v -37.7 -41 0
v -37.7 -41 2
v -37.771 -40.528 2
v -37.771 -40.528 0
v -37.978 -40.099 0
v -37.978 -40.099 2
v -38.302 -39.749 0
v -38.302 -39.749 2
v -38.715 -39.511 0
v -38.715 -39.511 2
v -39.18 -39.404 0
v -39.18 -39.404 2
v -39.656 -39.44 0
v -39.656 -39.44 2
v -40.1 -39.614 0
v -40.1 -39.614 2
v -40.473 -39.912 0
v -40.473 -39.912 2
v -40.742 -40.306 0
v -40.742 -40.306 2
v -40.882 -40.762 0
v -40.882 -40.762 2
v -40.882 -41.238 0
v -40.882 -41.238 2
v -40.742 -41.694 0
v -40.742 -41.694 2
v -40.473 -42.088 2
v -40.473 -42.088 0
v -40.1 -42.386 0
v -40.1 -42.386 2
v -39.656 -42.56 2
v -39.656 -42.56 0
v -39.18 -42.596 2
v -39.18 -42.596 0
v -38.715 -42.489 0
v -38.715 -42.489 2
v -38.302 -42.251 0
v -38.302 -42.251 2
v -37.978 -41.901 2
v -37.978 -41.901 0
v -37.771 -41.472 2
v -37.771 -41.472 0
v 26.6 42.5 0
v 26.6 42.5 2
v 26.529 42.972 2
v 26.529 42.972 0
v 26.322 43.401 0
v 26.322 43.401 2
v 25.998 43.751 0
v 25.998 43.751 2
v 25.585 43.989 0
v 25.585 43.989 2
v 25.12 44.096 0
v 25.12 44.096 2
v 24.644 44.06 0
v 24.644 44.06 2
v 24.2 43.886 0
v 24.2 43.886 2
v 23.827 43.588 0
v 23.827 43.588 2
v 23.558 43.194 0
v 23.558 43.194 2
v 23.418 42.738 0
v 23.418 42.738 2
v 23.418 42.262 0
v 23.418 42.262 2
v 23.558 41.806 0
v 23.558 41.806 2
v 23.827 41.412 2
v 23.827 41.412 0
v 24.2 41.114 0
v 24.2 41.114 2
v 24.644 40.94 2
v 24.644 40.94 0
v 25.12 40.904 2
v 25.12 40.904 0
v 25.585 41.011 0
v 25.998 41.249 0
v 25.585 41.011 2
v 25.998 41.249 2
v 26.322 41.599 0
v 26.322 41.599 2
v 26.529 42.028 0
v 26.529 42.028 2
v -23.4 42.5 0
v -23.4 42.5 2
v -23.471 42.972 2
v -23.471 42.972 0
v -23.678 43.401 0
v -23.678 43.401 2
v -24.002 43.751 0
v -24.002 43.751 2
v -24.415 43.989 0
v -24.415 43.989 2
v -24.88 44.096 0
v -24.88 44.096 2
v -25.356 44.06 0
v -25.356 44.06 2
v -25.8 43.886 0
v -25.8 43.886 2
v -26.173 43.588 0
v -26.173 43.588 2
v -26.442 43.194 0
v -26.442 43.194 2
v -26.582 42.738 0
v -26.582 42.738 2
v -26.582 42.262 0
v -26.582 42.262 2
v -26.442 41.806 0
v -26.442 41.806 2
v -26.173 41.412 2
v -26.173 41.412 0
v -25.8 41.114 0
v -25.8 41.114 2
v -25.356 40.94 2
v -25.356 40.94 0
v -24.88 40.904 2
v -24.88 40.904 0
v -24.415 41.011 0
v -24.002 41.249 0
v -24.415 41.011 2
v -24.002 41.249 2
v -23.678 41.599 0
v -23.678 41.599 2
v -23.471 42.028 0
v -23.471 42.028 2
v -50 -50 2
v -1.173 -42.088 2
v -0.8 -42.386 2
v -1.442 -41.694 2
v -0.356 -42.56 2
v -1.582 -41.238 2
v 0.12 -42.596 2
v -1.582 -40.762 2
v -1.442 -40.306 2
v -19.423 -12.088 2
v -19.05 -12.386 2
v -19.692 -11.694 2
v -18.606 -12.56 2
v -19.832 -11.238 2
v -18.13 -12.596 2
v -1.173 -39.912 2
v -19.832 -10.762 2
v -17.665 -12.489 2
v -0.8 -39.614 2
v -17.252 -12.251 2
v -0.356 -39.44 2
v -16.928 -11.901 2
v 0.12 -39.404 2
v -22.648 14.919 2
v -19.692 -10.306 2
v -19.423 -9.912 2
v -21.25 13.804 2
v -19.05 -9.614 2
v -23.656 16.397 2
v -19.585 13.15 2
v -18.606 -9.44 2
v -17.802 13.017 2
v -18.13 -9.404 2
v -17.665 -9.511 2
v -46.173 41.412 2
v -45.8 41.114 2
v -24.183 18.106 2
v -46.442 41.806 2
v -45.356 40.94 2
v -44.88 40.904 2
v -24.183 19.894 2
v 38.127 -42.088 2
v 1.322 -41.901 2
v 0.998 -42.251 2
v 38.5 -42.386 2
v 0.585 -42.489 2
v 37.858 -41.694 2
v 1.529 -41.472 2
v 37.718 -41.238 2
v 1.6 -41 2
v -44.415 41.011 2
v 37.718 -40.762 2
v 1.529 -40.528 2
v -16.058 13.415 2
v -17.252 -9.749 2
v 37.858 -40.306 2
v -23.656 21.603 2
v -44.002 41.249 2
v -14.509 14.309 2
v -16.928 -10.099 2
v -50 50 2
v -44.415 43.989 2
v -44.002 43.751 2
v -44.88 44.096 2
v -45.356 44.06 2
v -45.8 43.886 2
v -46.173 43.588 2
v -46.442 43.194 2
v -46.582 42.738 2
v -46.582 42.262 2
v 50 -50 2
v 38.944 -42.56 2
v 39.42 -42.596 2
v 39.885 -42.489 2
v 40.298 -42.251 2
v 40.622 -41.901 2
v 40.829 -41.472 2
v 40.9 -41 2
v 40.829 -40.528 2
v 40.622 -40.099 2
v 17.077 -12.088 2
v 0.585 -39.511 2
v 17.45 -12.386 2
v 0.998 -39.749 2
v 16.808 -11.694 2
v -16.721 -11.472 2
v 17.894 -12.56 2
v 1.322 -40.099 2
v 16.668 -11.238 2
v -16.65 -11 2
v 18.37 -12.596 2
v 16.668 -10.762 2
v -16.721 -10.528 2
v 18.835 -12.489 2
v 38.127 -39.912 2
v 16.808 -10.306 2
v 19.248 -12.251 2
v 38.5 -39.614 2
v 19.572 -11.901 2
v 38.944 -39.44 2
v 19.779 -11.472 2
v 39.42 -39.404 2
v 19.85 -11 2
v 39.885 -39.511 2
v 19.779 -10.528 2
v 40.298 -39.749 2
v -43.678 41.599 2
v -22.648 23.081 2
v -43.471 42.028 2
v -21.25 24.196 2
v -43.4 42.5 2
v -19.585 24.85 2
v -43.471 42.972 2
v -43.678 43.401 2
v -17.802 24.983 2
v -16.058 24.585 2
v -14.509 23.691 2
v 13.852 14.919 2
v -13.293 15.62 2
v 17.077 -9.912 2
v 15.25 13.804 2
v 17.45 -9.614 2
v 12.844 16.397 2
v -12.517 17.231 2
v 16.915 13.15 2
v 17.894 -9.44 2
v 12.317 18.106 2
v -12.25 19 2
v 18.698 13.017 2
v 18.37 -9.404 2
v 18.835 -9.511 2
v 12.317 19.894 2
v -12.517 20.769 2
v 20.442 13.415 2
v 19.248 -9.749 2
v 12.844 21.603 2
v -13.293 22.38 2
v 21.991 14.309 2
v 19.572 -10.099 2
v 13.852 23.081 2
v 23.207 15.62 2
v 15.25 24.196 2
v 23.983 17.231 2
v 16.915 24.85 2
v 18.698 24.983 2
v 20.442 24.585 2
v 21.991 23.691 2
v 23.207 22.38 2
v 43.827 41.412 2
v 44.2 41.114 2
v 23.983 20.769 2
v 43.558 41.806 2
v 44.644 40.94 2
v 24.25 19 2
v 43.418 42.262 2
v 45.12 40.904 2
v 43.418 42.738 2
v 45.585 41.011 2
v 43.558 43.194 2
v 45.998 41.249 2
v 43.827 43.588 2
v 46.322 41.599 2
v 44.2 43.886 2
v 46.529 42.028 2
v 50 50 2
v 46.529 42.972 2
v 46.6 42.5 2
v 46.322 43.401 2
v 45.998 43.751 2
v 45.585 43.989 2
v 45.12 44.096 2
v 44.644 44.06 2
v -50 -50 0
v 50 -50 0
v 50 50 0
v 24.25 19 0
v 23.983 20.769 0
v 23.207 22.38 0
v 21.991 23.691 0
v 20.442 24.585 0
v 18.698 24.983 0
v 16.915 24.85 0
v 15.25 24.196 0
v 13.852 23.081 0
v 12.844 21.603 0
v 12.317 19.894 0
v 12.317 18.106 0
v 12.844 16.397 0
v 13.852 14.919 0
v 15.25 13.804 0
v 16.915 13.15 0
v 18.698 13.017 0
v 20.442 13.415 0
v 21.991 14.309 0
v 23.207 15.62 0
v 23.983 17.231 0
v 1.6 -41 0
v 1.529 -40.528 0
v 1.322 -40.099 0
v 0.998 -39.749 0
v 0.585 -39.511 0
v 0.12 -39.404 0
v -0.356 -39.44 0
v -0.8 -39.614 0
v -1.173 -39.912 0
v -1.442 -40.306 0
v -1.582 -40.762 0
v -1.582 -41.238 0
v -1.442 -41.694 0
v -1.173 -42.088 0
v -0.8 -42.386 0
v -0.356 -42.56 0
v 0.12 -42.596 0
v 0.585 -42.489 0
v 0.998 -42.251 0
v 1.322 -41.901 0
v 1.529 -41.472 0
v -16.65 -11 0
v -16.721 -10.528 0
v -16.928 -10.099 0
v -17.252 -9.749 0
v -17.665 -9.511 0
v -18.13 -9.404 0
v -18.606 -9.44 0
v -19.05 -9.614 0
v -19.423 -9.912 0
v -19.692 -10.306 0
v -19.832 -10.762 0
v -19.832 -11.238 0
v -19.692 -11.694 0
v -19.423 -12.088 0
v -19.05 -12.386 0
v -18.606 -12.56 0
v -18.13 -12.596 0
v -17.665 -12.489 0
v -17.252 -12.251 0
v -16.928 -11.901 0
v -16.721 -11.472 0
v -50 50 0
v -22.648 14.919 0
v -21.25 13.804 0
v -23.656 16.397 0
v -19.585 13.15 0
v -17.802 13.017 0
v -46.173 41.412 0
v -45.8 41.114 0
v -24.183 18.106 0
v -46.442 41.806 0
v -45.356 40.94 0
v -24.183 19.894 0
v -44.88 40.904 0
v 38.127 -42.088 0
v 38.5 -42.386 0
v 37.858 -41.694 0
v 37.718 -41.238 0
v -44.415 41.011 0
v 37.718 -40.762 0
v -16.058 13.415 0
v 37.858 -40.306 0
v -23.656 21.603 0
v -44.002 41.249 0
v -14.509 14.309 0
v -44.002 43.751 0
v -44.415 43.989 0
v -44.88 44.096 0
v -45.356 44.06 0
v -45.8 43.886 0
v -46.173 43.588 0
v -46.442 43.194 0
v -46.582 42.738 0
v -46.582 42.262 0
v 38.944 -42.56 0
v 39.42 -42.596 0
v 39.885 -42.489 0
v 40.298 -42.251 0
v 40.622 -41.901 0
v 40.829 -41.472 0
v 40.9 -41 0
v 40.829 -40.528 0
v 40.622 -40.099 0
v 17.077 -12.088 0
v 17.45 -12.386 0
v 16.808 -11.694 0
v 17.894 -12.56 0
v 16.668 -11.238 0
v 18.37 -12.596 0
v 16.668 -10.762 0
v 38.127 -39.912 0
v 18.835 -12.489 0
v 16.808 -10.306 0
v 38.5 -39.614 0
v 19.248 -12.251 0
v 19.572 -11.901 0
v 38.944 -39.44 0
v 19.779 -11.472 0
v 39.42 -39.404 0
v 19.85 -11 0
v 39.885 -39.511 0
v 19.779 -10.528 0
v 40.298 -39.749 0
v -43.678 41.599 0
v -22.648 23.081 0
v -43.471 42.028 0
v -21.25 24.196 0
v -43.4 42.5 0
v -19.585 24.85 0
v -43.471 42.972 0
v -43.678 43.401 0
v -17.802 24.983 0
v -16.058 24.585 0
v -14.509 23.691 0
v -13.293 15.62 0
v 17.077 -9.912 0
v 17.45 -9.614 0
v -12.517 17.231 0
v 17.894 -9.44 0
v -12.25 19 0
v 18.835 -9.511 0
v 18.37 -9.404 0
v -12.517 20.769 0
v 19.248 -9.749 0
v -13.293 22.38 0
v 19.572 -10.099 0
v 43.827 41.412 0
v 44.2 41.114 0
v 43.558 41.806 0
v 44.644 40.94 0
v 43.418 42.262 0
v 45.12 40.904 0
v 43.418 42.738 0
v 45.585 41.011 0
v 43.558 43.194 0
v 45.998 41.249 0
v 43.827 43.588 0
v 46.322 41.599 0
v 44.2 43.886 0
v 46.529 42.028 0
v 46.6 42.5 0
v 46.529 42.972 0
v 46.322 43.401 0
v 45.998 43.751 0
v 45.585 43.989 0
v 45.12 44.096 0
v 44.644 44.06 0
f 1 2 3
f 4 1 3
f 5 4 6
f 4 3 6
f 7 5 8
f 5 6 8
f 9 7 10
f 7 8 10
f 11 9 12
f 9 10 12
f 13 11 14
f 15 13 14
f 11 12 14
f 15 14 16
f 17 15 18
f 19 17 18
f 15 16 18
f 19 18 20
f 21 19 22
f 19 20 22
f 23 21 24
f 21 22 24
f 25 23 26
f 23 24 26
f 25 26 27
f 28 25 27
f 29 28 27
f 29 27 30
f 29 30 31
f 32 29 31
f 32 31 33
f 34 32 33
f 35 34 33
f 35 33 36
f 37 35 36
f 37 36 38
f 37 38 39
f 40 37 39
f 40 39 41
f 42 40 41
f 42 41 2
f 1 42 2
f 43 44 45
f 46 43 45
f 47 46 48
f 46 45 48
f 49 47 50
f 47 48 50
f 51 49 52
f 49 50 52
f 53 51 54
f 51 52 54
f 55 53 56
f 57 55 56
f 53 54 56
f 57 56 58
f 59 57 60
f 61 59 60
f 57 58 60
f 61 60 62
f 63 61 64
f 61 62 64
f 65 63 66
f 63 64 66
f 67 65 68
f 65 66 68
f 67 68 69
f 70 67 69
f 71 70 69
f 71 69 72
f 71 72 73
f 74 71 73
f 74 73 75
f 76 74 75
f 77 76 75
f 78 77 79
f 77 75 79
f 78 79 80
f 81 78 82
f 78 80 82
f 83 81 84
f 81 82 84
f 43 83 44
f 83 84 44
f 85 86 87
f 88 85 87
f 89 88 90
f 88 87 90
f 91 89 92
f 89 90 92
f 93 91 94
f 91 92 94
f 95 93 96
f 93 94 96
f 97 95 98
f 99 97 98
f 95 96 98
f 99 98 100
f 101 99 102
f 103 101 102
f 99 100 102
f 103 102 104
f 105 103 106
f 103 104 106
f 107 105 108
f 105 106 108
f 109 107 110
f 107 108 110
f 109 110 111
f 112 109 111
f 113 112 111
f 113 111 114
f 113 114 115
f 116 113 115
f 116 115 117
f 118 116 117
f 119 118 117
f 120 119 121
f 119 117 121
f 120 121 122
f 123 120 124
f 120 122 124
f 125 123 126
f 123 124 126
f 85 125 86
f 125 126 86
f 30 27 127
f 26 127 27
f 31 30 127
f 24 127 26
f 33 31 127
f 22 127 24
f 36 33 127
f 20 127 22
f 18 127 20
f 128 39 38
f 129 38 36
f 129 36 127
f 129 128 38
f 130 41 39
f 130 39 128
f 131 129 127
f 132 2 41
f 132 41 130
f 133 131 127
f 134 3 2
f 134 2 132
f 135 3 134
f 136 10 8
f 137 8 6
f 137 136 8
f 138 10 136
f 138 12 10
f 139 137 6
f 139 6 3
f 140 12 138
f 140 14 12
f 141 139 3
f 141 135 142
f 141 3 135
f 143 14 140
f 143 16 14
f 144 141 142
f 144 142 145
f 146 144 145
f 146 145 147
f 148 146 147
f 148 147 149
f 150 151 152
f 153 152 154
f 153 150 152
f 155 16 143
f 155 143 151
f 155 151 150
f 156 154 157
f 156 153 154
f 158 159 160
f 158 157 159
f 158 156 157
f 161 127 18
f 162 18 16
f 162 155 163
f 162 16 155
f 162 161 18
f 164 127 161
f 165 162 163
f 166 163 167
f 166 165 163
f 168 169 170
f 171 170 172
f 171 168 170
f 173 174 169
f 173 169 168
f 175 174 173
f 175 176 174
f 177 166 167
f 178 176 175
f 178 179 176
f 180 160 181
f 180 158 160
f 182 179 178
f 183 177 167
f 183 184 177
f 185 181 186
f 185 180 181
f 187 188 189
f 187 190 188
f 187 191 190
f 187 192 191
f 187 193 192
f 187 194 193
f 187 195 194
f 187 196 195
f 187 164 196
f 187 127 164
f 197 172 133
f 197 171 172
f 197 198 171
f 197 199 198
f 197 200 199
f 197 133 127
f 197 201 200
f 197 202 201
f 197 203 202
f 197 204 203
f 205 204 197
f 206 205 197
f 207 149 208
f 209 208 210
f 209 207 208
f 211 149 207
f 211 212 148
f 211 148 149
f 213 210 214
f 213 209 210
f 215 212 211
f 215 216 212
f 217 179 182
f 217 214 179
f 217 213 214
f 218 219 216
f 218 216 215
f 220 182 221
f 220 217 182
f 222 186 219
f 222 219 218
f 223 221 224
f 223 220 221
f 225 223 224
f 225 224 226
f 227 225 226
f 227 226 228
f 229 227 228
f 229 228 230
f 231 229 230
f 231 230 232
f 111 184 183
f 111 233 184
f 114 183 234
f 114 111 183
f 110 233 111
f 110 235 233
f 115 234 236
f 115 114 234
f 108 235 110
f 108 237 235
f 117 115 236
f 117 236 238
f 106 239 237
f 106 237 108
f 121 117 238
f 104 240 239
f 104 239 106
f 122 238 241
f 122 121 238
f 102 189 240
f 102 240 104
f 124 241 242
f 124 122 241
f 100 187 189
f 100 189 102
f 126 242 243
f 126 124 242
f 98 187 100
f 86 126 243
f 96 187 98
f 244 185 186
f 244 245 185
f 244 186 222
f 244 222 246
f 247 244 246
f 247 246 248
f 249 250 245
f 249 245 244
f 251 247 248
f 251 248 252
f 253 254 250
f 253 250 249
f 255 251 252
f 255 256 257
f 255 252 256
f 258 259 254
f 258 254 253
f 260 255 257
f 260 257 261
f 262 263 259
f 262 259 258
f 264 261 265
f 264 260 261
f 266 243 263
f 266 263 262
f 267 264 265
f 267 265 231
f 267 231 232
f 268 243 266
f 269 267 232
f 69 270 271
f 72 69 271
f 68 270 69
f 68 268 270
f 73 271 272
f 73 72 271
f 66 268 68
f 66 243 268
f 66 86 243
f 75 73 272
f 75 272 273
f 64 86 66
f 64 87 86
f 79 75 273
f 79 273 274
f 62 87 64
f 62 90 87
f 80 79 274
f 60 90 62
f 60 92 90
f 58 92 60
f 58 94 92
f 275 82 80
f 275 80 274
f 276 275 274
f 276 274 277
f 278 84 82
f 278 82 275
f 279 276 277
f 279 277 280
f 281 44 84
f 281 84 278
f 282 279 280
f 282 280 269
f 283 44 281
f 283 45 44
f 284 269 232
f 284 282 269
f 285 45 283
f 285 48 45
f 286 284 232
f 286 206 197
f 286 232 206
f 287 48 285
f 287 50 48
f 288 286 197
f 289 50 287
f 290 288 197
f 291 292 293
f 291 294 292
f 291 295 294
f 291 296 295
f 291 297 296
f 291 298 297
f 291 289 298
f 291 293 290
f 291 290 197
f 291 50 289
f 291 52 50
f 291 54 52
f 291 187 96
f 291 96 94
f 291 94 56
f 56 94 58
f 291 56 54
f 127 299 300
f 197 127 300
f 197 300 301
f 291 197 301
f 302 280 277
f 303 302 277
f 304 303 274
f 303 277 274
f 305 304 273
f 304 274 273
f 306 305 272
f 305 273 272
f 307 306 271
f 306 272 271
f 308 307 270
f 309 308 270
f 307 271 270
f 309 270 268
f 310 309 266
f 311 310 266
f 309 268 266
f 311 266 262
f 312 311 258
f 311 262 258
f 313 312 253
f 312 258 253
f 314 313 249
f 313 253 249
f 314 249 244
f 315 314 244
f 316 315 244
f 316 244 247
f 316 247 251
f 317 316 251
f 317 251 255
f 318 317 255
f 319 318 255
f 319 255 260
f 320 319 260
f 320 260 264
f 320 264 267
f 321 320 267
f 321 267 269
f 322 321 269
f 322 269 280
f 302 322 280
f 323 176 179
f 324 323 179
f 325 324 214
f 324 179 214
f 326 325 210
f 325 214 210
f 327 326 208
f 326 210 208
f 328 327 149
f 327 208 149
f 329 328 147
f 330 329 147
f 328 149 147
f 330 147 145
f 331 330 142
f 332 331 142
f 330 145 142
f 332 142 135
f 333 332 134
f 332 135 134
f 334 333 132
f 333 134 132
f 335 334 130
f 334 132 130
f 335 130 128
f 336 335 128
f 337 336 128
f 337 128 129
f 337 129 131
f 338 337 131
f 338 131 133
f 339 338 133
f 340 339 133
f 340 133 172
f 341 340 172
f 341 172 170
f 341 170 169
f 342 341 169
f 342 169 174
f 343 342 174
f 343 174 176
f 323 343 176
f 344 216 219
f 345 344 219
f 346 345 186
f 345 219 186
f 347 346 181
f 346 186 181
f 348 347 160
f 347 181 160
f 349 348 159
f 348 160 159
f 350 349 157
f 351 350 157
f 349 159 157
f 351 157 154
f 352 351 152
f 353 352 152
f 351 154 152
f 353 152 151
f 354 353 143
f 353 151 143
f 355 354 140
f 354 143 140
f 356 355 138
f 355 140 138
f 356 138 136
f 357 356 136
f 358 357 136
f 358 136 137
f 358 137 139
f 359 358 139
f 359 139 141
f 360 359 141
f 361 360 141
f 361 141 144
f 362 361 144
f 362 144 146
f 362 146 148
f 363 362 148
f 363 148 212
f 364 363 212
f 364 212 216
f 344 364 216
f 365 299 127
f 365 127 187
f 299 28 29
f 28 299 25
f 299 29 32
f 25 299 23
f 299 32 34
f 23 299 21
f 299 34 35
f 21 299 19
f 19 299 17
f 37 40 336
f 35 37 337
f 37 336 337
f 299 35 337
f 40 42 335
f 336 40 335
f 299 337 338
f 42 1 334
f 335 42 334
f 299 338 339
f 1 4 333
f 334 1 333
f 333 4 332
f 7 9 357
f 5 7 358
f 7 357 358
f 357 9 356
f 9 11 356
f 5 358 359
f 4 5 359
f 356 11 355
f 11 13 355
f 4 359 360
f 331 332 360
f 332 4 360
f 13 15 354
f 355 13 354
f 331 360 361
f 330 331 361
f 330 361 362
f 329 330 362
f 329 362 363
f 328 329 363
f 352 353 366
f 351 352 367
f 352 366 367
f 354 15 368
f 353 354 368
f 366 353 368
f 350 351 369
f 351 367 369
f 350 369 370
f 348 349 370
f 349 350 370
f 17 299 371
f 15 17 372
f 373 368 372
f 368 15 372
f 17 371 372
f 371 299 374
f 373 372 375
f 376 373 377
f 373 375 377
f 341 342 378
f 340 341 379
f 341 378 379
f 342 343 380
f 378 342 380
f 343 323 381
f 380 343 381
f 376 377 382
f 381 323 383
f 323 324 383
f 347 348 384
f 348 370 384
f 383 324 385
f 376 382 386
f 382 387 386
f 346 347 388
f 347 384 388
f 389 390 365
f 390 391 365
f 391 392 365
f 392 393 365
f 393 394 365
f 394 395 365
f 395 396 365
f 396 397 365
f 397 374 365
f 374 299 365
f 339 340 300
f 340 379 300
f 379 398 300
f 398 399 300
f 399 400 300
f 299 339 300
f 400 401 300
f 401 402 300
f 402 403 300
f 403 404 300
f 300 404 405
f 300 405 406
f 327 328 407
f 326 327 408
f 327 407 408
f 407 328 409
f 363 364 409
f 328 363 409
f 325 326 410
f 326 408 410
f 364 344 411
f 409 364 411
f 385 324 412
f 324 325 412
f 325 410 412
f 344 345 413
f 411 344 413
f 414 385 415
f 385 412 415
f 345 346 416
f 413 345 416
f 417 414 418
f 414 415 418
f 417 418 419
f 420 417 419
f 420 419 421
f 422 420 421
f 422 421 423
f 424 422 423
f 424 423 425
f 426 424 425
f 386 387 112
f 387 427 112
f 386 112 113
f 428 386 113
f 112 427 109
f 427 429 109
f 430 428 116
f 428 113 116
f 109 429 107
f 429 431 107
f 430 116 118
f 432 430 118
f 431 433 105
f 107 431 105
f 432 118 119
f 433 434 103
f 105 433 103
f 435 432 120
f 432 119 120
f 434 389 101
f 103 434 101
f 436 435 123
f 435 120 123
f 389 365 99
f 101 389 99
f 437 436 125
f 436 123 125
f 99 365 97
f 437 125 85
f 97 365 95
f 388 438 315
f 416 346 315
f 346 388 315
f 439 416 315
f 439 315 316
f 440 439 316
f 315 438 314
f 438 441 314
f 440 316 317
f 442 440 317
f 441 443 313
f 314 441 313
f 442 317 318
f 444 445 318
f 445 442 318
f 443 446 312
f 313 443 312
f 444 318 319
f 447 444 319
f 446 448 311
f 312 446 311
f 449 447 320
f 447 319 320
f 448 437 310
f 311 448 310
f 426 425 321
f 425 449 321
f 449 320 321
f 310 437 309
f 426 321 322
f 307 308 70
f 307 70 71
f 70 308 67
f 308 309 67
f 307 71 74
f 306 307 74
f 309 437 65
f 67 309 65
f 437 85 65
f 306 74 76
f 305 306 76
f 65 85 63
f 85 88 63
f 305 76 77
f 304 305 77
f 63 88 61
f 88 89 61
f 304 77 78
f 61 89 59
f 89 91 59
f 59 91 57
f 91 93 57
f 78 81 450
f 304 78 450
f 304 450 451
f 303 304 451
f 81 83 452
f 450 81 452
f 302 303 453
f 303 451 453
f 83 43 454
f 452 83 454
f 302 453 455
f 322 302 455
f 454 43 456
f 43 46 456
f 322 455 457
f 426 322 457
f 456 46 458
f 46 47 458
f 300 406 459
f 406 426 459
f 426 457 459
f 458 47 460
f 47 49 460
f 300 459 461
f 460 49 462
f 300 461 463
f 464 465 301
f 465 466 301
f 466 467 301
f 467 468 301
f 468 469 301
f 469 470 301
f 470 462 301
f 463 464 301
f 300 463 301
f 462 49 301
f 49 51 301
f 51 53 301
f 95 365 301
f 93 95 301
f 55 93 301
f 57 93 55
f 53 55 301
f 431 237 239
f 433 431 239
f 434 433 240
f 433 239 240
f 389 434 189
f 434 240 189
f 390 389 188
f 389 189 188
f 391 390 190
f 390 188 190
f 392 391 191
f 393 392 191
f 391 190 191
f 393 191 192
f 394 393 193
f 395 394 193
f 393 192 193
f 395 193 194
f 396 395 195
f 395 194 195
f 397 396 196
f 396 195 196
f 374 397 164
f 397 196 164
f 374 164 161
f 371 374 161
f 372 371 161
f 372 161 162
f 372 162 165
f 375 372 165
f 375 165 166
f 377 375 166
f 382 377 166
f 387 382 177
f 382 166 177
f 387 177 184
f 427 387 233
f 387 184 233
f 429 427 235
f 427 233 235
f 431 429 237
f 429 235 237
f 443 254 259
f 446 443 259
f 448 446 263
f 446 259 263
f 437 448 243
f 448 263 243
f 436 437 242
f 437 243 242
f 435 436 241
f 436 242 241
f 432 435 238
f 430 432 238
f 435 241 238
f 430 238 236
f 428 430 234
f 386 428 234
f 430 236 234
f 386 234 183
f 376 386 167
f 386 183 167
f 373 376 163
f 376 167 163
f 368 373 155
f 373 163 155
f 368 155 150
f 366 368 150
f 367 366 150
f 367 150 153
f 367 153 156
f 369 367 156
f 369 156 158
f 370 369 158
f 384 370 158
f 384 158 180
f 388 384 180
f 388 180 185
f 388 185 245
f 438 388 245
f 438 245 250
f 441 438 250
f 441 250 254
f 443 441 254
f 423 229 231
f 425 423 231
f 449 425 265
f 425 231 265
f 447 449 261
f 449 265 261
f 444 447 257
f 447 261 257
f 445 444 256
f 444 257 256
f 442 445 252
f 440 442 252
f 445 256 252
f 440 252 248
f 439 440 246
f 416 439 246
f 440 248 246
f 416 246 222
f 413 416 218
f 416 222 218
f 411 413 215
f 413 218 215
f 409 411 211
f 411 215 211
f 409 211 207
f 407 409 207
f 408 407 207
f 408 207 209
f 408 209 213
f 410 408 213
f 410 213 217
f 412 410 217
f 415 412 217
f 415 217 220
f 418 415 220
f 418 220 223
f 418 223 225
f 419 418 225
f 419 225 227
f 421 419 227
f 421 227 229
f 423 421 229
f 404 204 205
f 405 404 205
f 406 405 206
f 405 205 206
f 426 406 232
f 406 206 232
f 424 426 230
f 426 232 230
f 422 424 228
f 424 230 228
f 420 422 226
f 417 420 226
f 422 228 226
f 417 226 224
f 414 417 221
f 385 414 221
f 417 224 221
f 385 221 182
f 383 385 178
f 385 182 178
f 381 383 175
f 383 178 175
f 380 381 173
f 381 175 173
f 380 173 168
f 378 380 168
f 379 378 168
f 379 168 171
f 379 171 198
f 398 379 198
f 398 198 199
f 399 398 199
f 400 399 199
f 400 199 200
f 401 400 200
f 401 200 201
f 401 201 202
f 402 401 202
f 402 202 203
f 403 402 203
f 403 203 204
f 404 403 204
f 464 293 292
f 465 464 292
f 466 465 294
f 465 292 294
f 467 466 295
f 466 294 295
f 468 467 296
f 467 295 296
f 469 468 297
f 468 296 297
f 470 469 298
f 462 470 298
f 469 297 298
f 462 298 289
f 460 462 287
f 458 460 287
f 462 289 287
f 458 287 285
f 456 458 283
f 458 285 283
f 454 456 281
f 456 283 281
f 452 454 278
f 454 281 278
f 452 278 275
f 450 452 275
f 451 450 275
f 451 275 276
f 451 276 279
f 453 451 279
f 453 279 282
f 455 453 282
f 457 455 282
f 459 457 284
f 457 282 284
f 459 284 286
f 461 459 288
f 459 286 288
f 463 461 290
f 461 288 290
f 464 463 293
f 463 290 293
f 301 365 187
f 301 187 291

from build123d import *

# Parameters (mm, degrees)
SKETCH_1_W          = 100
SKETCH_1_H          = 100
EXTRUDE_1_DEPTH     = 2
SKETCH_2_R          = 1.6
CUT_EXTRUDE_1_DEPTH = 2
SKETCH_3_R          = 1.6
CUT_EXTRUDE_2_DEPTH = 10
SKETCH_4_R          = 6
CUT_EXTRUDE_3_DEPTH = 38.65
SKETCH_5_R          = 1.6
CUT_EXTRUDE_4_DEPTH = 38.6
SKETCH_6_R          = 1.6
CUT_EXTRUDE_5_DEPTH = 10


with BuildPart() as part:
    # ｽｹｯﾁ1 → ﾎﾞｽ - 押し出し1 (new body)
    with BuildSketch(Plane.XY):
        Rectangle(SKETCH_1_W, SKETCH_1_H)
    extrude(amount=EXTRUDE_1_DEPTH)

    # ｽｹｯﾁ2 → ｶｯﾄ - 押し出し1 (cut)
    with BuildSketch(Plane.XY.offset(2)):
        with Locations((-45, 42.5)):
            Circle(SKETCH_2_R)
        with Locations((-25, 42.5)):
            Circle(SKETCH_2_R)
        with Locations((25, 42.5)):
            Circle(SKETCH_2_R)
        with Locations((45, 42.5)):
            Circle(SKETCH_2_R)
    extrude(amount=-CUT_EXTRUDE_1_DEPTH, mode=Mode.SUBTRACT)

    # ｽｹｯﾁ3 → ｶｯﾄ - 押し出し2 (cut)
    with BuildSketch(Plane.XY.offset(2)):
        with Locations((0, -41)):
            Circle(SKETCH_3_R)
    extrude(amount=-CUT_EXTRUDE_2_DEPTH, mode=Mode.SUBTRACT)

    # ｽｹｯﾁ4 → ｶｯﾄ - 押し出し3 (cut)
    with BuildSketch(Plane.XY.offset(2)):
        with Locations((-18.25, 19)):
            Circle(SKETCH_4_R)
        with Locations((18.25, 19)):
            Circle(SKETCH_4_R)
    extrude(amount=-CUT_EXTRUDE_3_DEPTH, mode=Mode.SUBTRACT)

    # ｽｹｯﾁ5 → ｶｯﾄ - 押し出し4 (cut)
    with BuildSketch(Plane.XY.offset(2)):
        with Locations((-18.25, -11)):
            Circle(SKETCH_5_R)
        with Locations((18.25, -11)):
            Circle(SKETCH_5_R)
    extrude(amount=-CUT_EXTRUDE_4_DEPTH, mode=Mode.SUBTRACT)

    # ｽｹｯﾁ6 → ｶｯﾄ - 押し出し5 (cut)
    with BuildSketch(Plane.XY.offset(2)):
        with Locations((-39.3, -41)):
            Circle(SKETCH_6_R)
        with Locations((39.3, -41)):
            Circle(SKETCH_6_R)
    extrude(amount=-CUT_EXTRUDE_5_DEPTH, mode=Mode.SUBTRACT)


solid = part.part
